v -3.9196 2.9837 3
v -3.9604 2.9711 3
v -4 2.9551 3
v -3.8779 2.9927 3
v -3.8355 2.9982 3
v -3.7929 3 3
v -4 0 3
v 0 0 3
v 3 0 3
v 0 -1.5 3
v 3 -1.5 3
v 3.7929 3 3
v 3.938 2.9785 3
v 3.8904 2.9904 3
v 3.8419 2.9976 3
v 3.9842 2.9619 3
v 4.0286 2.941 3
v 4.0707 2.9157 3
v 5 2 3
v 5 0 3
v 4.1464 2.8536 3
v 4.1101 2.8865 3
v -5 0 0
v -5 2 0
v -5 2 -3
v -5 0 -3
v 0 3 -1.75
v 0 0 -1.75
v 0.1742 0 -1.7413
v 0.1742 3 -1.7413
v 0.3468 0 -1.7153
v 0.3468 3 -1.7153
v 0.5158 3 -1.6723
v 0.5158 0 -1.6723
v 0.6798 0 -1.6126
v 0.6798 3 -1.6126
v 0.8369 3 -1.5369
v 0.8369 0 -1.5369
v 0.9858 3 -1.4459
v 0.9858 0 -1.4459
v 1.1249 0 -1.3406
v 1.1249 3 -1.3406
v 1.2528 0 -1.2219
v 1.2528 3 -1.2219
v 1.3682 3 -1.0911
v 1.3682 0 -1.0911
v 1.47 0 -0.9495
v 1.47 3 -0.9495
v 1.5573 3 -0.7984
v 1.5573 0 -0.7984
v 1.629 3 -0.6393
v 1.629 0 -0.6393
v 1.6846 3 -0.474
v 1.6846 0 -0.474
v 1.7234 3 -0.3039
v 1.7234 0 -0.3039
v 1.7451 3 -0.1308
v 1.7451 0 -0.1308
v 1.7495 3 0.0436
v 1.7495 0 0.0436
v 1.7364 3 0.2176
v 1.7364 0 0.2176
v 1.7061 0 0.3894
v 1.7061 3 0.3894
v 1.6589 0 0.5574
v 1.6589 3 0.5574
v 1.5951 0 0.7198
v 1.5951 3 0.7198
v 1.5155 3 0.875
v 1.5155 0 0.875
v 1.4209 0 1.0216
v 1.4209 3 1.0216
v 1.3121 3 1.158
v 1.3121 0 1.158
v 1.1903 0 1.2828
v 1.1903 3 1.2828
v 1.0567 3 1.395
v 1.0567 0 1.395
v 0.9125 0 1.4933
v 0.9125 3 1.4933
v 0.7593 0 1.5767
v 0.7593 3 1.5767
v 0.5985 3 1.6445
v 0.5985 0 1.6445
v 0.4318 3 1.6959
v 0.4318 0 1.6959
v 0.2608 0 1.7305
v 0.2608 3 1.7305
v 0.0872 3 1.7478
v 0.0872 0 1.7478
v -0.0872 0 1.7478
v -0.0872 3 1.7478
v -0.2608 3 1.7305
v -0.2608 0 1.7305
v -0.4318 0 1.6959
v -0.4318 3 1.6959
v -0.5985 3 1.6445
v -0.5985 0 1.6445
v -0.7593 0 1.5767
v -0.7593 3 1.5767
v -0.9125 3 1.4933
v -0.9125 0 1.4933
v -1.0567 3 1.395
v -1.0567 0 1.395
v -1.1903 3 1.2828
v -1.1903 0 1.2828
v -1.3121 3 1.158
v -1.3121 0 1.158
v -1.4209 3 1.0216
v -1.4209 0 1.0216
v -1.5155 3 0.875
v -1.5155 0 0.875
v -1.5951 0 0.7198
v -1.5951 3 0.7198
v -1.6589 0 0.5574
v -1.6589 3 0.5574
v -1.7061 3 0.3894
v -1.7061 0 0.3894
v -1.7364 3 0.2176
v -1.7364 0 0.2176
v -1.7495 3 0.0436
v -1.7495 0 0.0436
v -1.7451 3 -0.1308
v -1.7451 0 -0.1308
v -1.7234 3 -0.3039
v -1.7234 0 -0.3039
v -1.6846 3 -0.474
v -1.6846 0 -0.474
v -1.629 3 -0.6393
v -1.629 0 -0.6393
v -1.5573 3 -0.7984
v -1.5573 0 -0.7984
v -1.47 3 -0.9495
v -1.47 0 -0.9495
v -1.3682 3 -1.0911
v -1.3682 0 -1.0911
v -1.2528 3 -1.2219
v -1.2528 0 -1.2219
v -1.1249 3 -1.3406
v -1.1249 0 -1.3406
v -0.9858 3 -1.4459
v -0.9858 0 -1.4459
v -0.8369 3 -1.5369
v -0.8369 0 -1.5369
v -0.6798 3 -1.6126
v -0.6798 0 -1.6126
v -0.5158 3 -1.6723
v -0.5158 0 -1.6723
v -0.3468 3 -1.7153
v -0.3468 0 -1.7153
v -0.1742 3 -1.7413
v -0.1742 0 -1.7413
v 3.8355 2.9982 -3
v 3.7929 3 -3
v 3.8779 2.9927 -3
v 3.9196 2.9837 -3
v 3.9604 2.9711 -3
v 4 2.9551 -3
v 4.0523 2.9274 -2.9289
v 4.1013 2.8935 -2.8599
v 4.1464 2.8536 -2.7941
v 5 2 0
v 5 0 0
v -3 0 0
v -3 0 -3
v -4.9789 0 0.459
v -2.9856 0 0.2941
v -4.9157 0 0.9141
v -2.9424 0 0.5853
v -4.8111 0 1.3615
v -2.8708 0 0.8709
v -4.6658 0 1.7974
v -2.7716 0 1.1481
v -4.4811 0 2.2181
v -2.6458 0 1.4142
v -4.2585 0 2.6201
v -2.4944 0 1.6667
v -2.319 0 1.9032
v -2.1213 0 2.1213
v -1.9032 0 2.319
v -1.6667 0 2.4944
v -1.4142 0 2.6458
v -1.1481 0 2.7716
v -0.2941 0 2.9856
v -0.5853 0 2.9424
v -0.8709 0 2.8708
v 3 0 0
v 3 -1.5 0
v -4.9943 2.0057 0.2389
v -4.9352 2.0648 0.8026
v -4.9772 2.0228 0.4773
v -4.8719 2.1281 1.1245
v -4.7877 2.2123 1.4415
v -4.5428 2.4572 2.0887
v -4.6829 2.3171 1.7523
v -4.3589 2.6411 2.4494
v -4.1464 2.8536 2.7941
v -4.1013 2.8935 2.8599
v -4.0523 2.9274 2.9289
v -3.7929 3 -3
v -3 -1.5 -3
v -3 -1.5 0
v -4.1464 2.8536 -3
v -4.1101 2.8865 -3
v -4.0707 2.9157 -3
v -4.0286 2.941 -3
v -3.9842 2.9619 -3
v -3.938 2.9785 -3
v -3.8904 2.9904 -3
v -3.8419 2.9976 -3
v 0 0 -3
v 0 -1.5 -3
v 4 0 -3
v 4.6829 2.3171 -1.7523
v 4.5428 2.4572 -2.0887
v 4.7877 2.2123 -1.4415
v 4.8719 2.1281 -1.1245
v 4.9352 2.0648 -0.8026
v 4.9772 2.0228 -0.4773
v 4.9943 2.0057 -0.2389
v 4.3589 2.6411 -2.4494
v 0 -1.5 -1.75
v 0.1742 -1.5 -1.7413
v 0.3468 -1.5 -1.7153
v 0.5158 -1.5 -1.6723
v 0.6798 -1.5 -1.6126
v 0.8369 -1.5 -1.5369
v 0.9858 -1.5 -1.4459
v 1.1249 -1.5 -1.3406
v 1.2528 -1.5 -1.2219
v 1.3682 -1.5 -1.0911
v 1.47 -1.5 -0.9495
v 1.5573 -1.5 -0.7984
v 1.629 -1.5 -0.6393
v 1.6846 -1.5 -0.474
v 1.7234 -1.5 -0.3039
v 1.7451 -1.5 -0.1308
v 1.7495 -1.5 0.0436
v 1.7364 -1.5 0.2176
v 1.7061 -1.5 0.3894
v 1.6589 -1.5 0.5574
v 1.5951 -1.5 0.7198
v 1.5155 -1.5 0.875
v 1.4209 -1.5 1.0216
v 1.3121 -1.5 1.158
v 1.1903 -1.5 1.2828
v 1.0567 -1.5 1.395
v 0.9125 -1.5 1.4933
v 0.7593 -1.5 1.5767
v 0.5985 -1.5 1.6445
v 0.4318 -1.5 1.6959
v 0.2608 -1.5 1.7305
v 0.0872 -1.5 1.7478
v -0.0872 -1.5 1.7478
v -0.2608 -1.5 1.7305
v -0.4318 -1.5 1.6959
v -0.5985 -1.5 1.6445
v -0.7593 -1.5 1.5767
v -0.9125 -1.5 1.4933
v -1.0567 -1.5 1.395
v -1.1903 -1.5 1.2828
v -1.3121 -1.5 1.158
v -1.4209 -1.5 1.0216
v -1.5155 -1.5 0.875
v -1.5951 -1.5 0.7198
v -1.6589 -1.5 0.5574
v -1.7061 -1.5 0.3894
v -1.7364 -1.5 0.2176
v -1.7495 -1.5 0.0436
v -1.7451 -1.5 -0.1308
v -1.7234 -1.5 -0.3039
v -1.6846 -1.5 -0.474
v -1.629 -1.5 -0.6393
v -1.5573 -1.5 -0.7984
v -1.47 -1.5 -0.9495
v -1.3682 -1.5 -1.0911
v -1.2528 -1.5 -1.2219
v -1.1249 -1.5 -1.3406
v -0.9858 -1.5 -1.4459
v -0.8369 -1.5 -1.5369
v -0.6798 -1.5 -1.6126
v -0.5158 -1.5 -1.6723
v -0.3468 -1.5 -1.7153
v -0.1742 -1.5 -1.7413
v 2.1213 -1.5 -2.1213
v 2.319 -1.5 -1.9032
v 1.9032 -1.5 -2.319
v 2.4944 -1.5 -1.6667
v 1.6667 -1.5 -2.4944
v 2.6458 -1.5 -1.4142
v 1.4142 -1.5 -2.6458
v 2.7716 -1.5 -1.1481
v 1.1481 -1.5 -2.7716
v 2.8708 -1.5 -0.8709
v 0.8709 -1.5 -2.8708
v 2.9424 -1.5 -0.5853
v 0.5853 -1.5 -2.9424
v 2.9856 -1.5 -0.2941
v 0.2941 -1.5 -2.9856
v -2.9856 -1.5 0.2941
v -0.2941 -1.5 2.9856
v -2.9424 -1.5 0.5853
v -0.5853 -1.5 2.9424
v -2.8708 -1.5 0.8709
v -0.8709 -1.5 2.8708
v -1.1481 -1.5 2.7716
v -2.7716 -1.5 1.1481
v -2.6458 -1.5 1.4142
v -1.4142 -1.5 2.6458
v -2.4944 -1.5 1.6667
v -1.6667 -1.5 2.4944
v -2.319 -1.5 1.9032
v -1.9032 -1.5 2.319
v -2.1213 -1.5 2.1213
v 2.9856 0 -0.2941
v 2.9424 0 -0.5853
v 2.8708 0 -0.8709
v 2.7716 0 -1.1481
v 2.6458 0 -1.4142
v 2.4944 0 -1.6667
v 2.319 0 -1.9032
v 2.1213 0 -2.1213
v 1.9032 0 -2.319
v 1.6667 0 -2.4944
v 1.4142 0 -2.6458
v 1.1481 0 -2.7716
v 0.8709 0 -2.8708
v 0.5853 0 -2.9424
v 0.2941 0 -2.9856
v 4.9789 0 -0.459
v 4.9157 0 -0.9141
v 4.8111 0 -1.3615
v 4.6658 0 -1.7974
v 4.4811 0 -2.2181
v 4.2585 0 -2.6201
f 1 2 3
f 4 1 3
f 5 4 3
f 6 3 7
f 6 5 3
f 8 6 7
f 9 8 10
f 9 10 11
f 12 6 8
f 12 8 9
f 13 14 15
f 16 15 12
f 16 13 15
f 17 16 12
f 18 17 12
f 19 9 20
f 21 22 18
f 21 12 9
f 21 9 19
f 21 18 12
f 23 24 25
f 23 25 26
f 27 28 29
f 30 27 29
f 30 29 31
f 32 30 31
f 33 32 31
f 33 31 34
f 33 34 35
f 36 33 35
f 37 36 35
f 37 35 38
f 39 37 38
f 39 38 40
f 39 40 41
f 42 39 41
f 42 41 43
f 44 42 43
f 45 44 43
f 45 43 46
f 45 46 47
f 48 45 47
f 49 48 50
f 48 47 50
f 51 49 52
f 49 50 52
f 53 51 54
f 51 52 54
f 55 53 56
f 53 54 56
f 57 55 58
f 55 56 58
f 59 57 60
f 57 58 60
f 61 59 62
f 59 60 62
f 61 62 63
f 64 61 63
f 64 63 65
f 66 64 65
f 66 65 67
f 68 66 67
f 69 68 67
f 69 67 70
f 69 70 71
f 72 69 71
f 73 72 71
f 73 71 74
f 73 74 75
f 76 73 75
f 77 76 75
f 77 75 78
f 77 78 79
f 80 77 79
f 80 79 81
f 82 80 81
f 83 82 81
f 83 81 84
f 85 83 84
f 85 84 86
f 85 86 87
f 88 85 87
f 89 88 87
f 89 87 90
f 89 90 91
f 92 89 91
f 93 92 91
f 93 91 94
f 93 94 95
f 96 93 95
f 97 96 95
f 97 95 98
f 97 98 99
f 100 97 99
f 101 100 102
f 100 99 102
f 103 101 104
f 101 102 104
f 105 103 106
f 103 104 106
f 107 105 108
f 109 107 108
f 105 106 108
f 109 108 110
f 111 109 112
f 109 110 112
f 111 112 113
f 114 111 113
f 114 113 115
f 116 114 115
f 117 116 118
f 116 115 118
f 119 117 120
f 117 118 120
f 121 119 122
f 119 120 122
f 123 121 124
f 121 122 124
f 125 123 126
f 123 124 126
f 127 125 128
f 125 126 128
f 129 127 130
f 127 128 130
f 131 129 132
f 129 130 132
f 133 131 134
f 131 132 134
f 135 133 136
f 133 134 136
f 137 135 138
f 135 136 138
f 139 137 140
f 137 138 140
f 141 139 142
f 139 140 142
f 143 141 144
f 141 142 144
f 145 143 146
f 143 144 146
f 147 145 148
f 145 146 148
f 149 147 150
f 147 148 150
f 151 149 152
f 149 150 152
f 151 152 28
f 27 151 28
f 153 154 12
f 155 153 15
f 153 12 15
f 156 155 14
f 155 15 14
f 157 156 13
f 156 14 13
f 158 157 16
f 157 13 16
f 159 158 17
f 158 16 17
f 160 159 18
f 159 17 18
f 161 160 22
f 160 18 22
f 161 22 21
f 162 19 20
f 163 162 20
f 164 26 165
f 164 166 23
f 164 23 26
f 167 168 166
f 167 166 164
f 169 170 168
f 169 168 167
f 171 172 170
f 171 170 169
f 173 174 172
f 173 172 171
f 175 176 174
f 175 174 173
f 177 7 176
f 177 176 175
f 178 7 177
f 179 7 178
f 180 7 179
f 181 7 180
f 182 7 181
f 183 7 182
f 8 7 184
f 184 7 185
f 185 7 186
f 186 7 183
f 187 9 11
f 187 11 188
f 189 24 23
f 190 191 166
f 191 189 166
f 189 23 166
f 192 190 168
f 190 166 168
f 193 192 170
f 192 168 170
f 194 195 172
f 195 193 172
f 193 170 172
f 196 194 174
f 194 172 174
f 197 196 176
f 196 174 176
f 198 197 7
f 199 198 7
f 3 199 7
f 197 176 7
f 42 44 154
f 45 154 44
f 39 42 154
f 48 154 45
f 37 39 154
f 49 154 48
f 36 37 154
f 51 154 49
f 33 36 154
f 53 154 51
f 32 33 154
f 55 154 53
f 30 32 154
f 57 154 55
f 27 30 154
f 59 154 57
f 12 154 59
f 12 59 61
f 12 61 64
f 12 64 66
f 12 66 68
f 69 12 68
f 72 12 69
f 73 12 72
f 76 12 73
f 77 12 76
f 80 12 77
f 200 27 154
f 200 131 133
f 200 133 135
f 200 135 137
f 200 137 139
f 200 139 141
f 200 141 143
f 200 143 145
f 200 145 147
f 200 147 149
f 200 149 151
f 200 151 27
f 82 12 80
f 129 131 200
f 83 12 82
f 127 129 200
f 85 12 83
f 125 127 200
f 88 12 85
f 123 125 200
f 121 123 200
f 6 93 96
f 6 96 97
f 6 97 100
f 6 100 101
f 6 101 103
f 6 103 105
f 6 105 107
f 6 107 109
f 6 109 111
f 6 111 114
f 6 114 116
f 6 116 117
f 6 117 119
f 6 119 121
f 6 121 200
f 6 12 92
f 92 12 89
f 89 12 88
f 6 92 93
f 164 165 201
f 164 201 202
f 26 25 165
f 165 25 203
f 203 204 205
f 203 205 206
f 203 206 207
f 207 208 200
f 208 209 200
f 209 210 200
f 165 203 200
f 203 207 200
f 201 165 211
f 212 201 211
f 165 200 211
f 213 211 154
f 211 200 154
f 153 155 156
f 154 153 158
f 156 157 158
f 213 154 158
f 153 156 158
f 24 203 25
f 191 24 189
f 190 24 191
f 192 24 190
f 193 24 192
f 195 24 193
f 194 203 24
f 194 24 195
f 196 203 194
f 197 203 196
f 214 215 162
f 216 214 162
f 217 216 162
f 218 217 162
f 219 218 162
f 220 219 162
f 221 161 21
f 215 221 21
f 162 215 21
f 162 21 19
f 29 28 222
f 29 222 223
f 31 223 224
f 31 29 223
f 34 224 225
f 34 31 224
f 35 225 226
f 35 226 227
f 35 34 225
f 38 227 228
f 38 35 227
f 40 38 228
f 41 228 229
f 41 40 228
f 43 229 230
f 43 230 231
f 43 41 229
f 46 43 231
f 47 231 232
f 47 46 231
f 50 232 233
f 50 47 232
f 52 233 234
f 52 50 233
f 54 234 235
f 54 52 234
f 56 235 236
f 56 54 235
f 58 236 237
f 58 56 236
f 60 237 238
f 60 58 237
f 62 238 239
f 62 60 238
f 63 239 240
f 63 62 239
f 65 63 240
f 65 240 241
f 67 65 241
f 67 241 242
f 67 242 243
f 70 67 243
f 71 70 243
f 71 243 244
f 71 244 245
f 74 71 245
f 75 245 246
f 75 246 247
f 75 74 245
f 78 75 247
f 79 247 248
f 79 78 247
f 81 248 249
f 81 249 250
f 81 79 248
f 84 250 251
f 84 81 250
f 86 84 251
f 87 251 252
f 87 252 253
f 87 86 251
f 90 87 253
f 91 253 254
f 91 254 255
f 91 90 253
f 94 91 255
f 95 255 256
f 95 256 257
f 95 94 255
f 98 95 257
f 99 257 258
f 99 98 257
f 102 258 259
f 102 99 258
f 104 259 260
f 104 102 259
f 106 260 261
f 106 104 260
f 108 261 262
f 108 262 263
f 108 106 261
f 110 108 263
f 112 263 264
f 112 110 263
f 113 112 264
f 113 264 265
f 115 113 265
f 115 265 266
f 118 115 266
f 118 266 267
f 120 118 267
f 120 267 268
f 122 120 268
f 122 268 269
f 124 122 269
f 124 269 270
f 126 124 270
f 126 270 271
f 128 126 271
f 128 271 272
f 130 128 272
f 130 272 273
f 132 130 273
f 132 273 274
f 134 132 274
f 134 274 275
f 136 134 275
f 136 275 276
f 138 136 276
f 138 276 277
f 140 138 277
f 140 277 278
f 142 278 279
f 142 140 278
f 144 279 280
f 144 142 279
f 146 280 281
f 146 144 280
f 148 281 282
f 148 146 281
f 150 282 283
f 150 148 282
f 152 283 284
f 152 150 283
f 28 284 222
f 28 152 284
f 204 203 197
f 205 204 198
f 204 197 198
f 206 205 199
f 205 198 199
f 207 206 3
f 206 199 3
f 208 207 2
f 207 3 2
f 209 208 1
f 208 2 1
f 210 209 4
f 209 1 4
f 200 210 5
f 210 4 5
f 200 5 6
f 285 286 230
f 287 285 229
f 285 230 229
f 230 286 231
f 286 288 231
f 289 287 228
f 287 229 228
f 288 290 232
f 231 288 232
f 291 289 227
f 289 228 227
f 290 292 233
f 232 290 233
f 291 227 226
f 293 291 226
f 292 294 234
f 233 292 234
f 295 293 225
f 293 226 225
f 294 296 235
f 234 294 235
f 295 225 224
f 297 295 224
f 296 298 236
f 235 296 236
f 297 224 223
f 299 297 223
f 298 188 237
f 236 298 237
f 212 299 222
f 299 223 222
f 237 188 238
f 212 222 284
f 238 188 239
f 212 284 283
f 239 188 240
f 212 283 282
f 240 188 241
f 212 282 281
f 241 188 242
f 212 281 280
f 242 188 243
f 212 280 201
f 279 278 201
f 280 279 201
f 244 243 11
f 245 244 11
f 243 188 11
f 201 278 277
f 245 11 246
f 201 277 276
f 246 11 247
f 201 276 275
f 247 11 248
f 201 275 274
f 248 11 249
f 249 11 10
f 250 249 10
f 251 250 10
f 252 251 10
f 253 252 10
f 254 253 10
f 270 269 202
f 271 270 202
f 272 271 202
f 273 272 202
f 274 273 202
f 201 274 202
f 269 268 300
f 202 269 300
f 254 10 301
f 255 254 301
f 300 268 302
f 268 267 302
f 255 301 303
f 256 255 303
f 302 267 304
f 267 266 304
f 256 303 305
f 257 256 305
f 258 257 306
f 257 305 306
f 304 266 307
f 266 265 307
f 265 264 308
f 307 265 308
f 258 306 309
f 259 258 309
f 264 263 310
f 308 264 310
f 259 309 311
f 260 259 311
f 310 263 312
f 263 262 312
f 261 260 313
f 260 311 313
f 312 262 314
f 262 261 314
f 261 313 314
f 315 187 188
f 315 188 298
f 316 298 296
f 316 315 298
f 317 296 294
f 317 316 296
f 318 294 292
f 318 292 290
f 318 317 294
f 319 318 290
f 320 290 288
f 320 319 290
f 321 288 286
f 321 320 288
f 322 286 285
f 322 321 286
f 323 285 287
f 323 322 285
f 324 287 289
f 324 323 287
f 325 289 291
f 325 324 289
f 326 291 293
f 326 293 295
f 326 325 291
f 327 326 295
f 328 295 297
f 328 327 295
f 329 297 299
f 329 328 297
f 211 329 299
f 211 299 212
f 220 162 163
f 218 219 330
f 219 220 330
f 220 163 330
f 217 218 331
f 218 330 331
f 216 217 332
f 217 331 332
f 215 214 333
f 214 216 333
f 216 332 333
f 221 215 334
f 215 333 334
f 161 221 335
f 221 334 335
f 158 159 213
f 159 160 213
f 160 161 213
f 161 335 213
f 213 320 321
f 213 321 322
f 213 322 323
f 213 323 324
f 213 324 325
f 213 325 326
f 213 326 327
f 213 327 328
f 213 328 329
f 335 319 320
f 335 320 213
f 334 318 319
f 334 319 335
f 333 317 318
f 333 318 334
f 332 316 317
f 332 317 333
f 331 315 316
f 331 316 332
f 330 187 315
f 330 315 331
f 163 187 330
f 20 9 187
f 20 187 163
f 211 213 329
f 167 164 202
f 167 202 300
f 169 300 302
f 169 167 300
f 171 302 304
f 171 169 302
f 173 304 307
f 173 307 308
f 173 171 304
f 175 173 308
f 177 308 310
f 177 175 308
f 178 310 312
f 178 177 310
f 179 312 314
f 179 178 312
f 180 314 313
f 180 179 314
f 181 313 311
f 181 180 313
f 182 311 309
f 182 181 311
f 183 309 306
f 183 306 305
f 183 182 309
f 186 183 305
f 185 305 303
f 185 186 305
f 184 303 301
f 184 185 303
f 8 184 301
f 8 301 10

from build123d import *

# Parameters (mm, degrees)
EXTRUDE_1_DEPTH     = 3
SKETCH_2_R          = 1.75
EXTRUDE_2_DEPTH     = 1.5
SKETCH_2_2_R        = 1.75
CUT_EXTRUDE_1_DEPTH = 7.557438524
CUT_EXTRUDE_2_DEPTH = 7.557438524
FILLET_1_R          = 0.5


with BuildPart() as part:
    # Эскиз1 → Бобышка-Вытянуть1 (new, symmetric)
    with BuildSketch(Plane.XY):
        Polygon((4, 3), (5, 2), (5, 0), (0, 0), (0, 3), align=None)
    extrude_1 = extrude(amount=EXTRUDE_1_DEPTH, both=True)

    # Зеркальное отражение1: Бобышка-Вытянуть1 across plane
    add(extrude_1.mirror(Plane(origin=(0, 0, 0), x_dir=(0, 0, 1), z_dir=(1, 0, 0))))

    # Эскиз2 → Бобышка-Вытянуть2 (add)
    with BuildSketch(Plane.XZ):
        with BuildLine():
            Line((0, -3), (-3, -3))
            Line((-3, -3), (-3, 0))
            ThreePointArc((-3, 0), (-2.121320344, 2.121320344), (0, 3))
            Line((0, 3), (3, 3))
            Line((3, 3), (3, 0))
            ThreePointArc((3, 0), (2.121320344, -2.121320344), (0, -3))
        make_face()
        Circle(SKETCH_2_R, mode=Mode.SUBTRACT)
    extrude(amount=EXTRUDE_2_DEPTH)

    # Эскиз2<2> → Вырез-Вытянуть1 (cut, through all)
    with BuildSketch(Plane.XZ):
        Circle(SKETCH_2_2_R)
    extrude(amount=-CUT_EXTRUDE_1_DEPTH, mode=Mode.SUBTRACT)

    # Эскиз3 → Вырез-Вытянуть2 (cut, through all)
    with BuildSketch(Plane.XZ):
        with BuildLine():
            ThreePointArc((-5, 0), (-3.535533906, 3.535533906), (0, 5))
            Line((0, 5), (0, 5.722939185))
            Line((0, 5.722939185), (-8.00916489, 5.722939185))
            Line((-8.00916489, 5.722939185), (-8.00916489, 0))
            Line((-8.00916489, 0), (-5, 0))
        make_face()
        with BuildLine():
            Line((8.00916489, 0), (5, 0))
            ThreePointArc((5, 0), (3.535533906, -3.535533906), (0, -5))
            Line((0, -5), (0, -5.722939185))
            Line((0, -5.722939185), (8.00916489, -5.722939185))
            Line((8.00916489, -5.722939185), (8.00916489, 0))
        make_face()
    extrude(amount=-CUT_EXTRUDE_2_DEPTH, mode=Mode.SUBTRACT)

    # Скругление1
    fillet_1_edges = [part.edges().sort_by_distance(p)[0] for p in [
        (4, 3, 0),
        (-4, 3, 0),
    ]]
    fillet(fillet_1_edges, radius=FILLET_1_R)


solid = part.part
